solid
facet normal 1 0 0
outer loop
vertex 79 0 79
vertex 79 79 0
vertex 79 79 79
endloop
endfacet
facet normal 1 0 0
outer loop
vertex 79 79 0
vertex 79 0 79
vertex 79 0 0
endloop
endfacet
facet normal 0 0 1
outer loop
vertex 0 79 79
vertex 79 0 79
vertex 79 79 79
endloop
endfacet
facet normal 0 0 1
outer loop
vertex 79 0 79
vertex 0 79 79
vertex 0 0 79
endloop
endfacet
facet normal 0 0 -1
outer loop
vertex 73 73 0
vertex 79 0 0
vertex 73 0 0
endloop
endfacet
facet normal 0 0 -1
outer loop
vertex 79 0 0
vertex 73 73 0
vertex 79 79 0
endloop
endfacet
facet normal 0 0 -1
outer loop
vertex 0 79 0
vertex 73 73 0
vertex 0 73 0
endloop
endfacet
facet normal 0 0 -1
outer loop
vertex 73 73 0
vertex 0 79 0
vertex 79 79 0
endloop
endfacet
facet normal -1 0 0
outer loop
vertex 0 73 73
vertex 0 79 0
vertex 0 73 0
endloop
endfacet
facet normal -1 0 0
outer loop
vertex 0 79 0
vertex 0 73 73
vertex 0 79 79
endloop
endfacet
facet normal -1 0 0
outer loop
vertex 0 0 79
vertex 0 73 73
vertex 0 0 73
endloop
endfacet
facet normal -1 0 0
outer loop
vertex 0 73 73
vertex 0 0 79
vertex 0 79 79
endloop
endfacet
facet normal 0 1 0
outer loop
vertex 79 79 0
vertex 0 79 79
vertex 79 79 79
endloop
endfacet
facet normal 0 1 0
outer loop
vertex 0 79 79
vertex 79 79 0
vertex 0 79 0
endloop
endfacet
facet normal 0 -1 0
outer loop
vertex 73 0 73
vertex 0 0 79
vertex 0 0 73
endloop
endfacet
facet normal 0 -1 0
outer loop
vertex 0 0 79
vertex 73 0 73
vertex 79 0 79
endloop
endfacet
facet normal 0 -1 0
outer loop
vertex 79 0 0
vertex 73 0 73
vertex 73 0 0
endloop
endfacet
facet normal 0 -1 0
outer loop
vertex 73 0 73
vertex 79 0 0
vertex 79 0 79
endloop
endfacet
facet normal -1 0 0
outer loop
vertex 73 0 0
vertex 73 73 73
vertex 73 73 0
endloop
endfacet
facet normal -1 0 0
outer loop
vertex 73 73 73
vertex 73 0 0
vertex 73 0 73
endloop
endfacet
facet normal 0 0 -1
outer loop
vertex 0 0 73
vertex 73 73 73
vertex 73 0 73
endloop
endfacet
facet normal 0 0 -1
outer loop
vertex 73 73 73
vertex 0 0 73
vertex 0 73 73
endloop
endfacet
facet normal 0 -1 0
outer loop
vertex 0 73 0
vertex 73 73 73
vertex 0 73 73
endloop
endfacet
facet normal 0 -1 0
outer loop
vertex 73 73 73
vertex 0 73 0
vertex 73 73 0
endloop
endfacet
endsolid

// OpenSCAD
/*
 * Butter Holder
 */

T = 3;
H = 27;
W = 79;
L = 158;
difference() {
    cube(W, L, H);
    translate(T, T, T) {
      cube(W-(2*T),L-(2*T),H-T);
    }
}
